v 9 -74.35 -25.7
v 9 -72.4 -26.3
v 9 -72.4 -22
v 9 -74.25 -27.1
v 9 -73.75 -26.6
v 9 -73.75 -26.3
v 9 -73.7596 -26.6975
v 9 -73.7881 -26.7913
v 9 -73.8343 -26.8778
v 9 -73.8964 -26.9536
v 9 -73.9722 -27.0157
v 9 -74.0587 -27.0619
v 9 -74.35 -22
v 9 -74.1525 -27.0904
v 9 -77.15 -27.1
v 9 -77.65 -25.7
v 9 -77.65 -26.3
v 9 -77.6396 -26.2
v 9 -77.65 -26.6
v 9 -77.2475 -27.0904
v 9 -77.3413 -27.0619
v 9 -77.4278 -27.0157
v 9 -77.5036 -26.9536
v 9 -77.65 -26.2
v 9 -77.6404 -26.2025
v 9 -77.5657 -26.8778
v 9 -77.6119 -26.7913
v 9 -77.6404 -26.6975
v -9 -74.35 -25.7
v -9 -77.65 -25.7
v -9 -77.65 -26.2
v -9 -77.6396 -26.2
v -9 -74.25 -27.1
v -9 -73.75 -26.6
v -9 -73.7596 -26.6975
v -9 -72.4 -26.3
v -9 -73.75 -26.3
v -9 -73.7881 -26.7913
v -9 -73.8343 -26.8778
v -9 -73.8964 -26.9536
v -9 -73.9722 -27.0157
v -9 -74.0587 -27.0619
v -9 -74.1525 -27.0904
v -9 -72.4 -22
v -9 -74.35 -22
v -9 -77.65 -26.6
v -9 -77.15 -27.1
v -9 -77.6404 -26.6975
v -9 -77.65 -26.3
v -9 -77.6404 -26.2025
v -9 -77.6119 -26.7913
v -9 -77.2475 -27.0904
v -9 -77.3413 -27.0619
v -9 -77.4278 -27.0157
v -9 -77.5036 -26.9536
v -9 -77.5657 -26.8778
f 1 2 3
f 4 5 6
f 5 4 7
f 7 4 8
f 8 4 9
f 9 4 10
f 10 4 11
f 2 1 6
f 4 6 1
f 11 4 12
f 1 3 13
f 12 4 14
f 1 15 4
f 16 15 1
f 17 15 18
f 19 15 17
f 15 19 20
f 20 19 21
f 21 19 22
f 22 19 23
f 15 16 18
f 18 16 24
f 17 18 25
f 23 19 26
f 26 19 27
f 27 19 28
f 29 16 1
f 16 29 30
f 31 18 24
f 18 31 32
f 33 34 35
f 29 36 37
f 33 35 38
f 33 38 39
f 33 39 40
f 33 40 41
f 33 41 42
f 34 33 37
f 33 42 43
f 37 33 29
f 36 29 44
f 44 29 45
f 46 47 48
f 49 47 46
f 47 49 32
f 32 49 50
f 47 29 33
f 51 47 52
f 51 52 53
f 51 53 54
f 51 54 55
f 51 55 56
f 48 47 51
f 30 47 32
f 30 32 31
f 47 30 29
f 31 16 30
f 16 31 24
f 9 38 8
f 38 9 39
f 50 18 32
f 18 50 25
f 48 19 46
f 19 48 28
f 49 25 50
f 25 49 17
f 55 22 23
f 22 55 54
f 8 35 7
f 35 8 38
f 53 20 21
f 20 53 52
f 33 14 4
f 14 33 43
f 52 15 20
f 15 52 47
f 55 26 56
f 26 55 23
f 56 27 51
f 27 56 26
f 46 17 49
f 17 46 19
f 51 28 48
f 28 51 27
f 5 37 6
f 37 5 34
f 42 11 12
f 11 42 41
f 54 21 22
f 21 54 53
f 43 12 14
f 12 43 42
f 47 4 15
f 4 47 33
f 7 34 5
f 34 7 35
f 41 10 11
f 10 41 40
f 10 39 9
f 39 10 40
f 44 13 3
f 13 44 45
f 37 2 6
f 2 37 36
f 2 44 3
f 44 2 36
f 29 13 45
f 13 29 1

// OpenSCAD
// =============================================================================
// LEAD-NOTCH GROMMET — TPU edge liner, shoulder battery-lead notch (print: TPU 95A)
// =============================================================================
// AUD-12b (2026-07-10): leg_v6/shoulder.scad's battery-lead notch (flange
// bottom center, x +/-10, z -38.1..-26 — REAR end: pack->MRBF leads; FRONT
// end, same part: D456 right-angle USB-C) was a zero-radius 90deg through-cut
// in abrasive PA6-CF, with leads running unsupported from the belly pack
// (trunk x~-78) into it. shoulder.scad now chamfers all 4 nominal edges at
// both flange mouths (lead_notch()/notch_bevel()); this part is the TPU liner
// that rides that chamfer, same "raw edge -> TPU radius" job as
// chassis/case_slot_grommet.scad, ported here.
//
// ---- notch geometry (leg_v6/shoulder.scad, read 2026-07-10 — keep in sync) --
// Built in the SAME shoulder-LOCAL frame as shoulder.scad itself (not trunk
// world coords) — open both STLs together to check the fit, same practice as
// case_slot_grommet.scad opening against riser_bay.stl in ITS frame.
// FLANGE_Y0=-77.7, FLANGE_Y1=-73.7 (4mm flange thickness, the wall this
// liner clips onto). NOTCH_X0/X1 = +/-10 (20mm nominal width). NOTCH_TOP =
// -26 — the ONLY genuine material edge the leads chafe on: the notch is
// OPEN at the BOTTOM (the flange's own solid stops dead at z=-38, 0.1mm
// short of the notch cut's z0=-38.1 — that -0.1 is the standard EPS-overcut
// idiom, not a deliberate 4th edge) and the left/right ends (x=+/-10) are
// the slot's own end corners — same "protect the flat run, not the rounded
// corners" call case_slot_grommet.scad makes with its own LINER_LEN inset.
//
// ---- axis mapping vs case_slot_grommet.scad (ported pattern) ---------------
// case_slot_grommet's SLOT LENGTH axis (X) <-> this part's NOTCH WIDTH axis
// (X) — same LINER_LEN-inset-from-the-full-span idiom (18 of 20mm here,
// span "~18mm inset from the 20mm" per the fix brief — EXACT match).
// case_slot_grommet's WALL-THICKNESS/grip axis (Z, DECK_T=4mm) <-> this
// part's flange-thickness axis (Y, FLANGE_T=4mm) — same GAP=T-0.1=3.9
// light-interference idiom ("GAP~=3.9 for a 4mm flange" per the fix brief —
// EXACT match). case_slot_grommet's OPEN-EDGE axis (Y, EDGE_Y) <-> this
// part's OPEN-EDGE axis (Z, NOTCH_TOP) — the rounded_prism() helper below is
// case_slot_grommet's, copied verbatim (it's already axis-generic: it just
// places cylinders at the 2nd/3rd args it's given).
//
// ---- design: spine (rounds the top edge, BOTH flange mouths — leads may
// bend over either face depending on routing) + ONE retention lip -----------
// case_slot_grommet ended up BOTTOM-LEG-ONLY after finding a two-leg design
// fights a neighboring part; this notch has no such neighbor, but the SAME
// "bottom-leg [i.e. one-sided] clip is enough" call applies here for a
// simpler reason: the notch's own "bottom" is open air (see above), so
// there's no flat face there to clip onto at all — the one real analog of
// case_slot_grommet's leg (a flat plate pressed flush against solid
// material just past the open edge) is a plate against the flange's
// EXTERIOR (Y1) face, hooking over the top edge into the solid flange
// material that continues above the notch (z>NOTCH_TOP). Retention is
// secondary to the GAP interference fit anyway — the lead bundle itself is
// strap-retained, same call as case_slot_grommet's zip-tie tab (no tab
// needed here — nothing this liner carries pulls axially on it).
// No slit: like case_slot_grommet, this is an OPEN profile (never wraps a
// full loop around the bundle) — press-installs onto the chamfered top edge
// directly, no threading required, so there's nothing to slit.
//
// Fit gate: chassis/build_all.sh renders + mesh_health.py-checks this file
// (watertight + single body). Not a check_fit.py case (no automated seat
// gate — the shoulder-local frame + shoulder's own gate coverage make a
// dedicated case low value here; verified by direct measurement instead,
// see the FIX B report).

$fn = 32;
EPS = 0.05;

// ---- source consts (leg_v6/shoulder.scad — keep in sync) --------------------
FLANGE_Y0 = -77.7;  FLANGE_Y1 = -73.7;    // 4mm flange thickness
FLANGE_T  = FLANGE_Y1 - FLANGE_Y0;         // 4.0
NOTCH_TOP = -26;                           // the one real material edge

// ---- liner geometry (ported from chassis/case_slot_grommet.scad) -----------
LINER_LEN = 18;                    // x +/-9 — inset 1mm off the 20mm notch
                                    // each side, clear of the end corners
GAP       = FLANGE_T - 0.1;        // 3.9 — light interference on the 4mm flange
Y0        = FLANGE_Y0 + (FLANGE_T - GAP) / 2;   // grip band, centered in the flange
Y1        = FLANGE_Y1 - (FLANGE_T - GAP) / 2;

SPINE_BACK = 0.3;    // core embeds this far past the top edge (z>NOTCH_TOP,
                      // real solid flange material) — light interference,
                      // same role as case_slot_grommet's SPINE_BACK
SPINE_FWD  = 1.1;     // spine protrusion down into the passage (z<NOTCH_TOP)
                       // — rounds the raw edge without eating much of the
                       // ~10mm clear height left under it
CAP_R      = 0.5;      // spine corner-rounding radius (passage side only)

LEG_T      = 1.3;       // retention lip thickness
LEG_REACH  = 4.0;        // lip reaches this far above NOTCH_TOP into the
                          // solid flange material at the exterior (Y1) face
                          // — "whatever solid backs the notch"

assert(CAP_R <= (Y1 - Y0) / 2, "CAP_R too big for the flange grip band");
assert(CAP_R <= (SPINE_FWD + 0.2) / 2, "CAP_R too big for the spine's z-span");

module xcyl(r, len) {
    rotate([0, 90, 0]) cylinder(r = r, h = len, center = true);
}

// rounded prism swept along X — case_slot_grommet.scad's rounded_prism(),
// copied verbatim (hull of 4 corner cylinders; exact-bounds only if
// r <= half of both spans, asserted at the call sites above).
module rounded_prism(len, y0, y1, z0, z1, r) {
    hull()
        for (py = [y0 + r, y1 - r], pz = [z0 + r, z1 - r])
            translate([0, py, pz]) xcyl(r, len);
}

module lead_notch_grommet() {
    union() {
        // spine flat core: full flange grip band (Y0..Y1), embeds
        // SPINE_BACK past the top edge into real flange material (square
        // corners there — never exposed to the cable) down to just short of
        // the rounded cap below (overlap for a clean union, same idiom as
        // case_slot_grommet's core/cap overlap).
        translate([-LINER_LEN / 2, Y0, NOTCH_TOP - 0.2])
            cube([LINER_LEN, Y1 - Y0, SPINE_BACK + 0.2]);
        // rounded cap: protrudes into the passage (z<NOTCH_TOP), rounded on
        // the exposed tip — this is what the cable actually rides.
        rounded_prism(LINER_LEN, Y0, Y1, NOTCH_TOP - SPINE_FWD,
                     NOTCH_TOP + 0.2, CAP_R);
        // retention lip: flat plate flush against the flange's EXTERIOR
        // (Y1) face, hooking over the top edge into the solid flange
        // material above it (z>NOTCH_TOP) — generous overlap into the
        // spine/cap for a clean single-body union.
        translate([-LINER_LEN / 2, Y1 - 0.6, NOTCH_TOP - 0.3])
            cube([LINER_LEN, (FLANGE_Y1 + LEG_T) - (Y1 - 0.6),
                  LEG_REACH + 0.3]);
    }
}

lead_notch_grommet();
